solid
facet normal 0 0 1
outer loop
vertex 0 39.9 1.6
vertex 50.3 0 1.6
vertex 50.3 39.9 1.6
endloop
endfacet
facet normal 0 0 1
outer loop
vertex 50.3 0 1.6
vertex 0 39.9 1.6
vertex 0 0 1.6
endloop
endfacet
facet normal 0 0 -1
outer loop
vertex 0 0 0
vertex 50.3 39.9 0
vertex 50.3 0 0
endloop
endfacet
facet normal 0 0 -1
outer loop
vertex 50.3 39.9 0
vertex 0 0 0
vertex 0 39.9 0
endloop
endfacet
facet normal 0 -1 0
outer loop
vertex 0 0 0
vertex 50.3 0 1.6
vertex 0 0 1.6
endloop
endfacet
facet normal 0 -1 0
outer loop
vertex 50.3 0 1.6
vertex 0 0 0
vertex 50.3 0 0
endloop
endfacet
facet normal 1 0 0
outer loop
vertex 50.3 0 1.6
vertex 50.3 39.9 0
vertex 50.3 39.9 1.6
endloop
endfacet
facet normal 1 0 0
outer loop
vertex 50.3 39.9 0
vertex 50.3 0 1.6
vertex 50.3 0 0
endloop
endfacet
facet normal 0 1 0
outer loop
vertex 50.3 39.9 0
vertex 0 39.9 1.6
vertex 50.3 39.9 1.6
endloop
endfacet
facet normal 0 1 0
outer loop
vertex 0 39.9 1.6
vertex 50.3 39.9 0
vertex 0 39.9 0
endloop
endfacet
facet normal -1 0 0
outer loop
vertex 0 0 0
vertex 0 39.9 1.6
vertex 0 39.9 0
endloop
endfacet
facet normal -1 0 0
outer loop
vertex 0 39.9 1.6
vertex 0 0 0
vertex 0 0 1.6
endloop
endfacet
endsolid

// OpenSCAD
// file: measurements/pcb.scad
/**
 * The distance between the left and right edges of the PCB, in millimeters.
 */
pcb_width = 50.3;

/**
 * The distance between the top and bottom edges of the PCB, in millimeters.
 */
pcb_height = 39.9;

/**
 * The thickness of the PCB, in millimeters.
 */
pcb_thickness = 1.6;

/**
 * The amount of tolerance between each side of the PCB's casing and the retaining wall, in millimeters.
 */
pcb_xy_tolerance = 0.25;

/**
 * The amount of tolerance above and below the PCB, in millimeters.
 */
pcb_z_tolerance = 0.125;

/**
 * The thickness of the PCB retaining wall, in millimeters.
 */
pcb_retainer_thickness = 0.6;

/**
 * The amount of clearance behind the PCB, in millimeters.
 */
pcb_back_clearance = 5;
// main file
include <measurements/pcb.scad>;

cube([
  pcb_width,
  pcb_height,
  pcb_thickness,
]);
